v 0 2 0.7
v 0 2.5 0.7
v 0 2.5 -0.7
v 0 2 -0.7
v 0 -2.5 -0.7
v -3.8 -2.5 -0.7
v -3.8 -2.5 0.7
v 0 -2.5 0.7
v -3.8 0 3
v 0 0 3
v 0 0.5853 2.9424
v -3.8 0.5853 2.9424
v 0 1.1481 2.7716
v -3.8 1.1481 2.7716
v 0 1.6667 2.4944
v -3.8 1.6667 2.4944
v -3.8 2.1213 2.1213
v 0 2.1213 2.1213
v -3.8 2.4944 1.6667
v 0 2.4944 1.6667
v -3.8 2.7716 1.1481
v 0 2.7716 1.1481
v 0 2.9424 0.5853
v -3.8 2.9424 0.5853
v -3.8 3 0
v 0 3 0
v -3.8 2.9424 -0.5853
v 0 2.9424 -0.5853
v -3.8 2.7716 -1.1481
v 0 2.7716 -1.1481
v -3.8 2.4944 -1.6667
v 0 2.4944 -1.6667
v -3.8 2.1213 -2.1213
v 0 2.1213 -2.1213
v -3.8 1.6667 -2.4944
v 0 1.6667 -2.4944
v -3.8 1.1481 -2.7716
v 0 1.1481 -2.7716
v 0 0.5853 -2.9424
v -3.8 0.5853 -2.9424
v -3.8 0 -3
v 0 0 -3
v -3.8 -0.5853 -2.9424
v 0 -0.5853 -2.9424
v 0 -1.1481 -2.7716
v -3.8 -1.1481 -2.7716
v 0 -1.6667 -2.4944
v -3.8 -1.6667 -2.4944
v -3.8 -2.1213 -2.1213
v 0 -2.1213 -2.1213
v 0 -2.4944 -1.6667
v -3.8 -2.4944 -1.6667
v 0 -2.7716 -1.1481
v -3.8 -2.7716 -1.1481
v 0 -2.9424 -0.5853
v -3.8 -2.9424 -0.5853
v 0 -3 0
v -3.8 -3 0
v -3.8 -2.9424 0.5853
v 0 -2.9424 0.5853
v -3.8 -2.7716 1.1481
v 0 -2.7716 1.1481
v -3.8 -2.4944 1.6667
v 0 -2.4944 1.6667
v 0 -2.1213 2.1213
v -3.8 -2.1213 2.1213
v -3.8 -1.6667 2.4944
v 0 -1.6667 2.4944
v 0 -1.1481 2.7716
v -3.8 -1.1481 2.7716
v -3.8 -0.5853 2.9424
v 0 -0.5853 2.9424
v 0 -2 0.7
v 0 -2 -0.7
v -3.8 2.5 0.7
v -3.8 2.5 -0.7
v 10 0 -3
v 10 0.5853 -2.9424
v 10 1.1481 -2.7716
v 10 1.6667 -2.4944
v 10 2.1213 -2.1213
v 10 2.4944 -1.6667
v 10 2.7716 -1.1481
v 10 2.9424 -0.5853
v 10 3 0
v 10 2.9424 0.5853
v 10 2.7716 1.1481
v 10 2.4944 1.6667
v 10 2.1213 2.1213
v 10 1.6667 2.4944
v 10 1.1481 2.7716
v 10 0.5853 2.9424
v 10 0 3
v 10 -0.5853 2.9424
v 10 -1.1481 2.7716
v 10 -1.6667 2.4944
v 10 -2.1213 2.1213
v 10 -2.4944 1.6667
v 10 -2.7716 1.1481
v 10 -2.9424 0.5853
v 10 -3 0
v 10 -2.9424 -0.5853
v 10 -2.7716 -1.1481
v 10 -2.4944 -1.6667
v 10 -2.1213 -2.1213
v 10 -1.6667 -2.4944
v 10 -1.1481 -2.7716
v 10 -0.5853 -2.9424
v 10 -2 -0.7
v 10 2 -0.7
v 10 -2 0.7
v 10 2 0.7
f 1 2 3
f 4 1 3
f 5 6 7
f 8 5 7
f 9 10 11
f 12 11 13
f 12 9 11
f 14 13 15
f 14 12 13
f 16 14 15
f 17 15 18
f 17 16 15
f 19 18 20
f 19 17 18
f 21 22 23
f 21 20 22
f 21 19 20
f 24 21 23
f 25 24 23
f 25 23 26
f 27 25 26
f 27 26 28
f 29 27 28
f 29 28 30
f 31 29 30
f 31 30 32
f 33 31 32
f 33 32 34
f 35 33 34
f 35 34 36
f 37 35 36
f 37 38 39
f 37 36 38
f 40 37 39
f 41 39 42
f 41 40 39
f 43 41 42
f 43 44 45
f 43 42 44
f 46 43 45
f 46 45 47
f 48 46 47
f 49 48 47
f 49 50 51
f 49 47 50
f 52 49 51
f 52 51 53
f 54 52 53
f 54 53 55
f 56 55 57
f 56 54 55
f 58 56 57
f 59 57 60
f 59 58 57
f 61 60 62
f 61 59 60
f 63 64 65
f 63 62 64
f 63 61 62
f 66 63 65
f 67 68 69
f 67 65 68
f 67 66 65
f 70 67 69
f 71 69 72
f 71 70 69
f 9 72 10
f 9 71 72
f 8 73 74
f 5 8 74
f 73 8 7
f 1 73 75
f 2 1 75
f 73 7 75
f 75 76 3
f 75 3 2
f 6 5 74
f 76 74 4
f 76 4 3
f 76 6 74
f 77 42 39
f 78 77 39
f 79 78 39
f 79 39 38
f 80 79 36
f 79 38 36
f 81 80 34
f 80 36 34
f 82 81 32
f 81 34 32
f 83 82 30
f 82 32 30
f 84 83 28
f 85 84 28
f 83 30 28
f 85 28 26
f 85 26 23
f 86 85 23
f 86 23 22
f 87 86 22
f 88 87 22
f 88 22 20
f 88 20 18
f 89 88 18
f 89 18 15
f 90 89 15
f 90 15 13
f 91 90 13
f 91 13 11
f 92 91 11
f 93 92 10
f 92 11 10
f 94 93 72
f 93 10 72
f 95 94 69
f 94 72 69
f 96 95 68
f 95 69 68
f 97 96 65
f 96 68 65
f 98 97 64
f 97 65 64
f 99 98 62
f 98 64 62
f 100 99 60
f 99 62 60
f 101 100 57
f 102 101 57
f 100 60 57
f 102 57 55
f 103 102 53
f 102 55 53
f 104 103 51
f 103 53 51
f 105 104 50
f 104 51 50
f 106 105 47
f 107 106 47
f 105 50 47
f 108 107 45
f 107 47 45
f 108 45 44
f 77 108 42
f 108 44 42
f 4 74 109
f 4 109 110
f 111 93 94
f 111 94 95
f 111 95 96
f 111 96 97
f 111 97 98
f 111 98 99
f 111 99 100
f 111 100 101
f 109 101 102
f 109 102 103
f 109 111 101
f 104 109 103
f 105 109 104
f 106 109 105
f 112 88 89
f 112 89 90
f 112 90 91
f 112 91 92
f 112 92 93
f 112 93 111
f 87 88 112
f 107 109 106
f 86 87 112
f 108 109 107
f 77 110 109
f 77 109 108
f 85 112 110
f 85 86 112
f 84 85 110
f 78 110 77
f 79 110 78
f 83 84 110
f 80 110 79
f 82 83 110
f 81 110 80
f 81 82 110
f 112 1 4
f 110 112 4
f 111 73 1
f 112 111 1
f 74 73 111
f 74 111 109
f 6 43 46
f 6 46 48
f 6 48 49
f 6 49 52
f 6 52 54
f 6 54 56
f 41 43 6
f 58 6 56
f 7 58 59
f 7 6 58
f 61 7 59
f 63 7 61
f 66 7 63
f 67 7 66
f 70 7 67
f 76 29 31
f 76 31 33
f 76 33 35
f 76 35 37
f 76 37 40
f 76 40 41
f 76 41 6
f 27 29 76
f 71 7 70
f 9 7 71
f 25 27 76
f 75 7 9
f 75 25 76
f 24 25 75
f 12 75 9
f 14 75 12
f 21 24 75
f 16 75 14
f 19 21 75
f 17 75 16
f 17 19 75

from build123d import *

# Parameters (mm, degrees)
SKETCH1_R           = 3
SKETCH1_W           = 1.4
SKETCH1_H           = 4
BOSS_EXTRUDE1_DEPTH = 10
BOSS_EXTRUDE2_START = 3.8
SKETCH2_R           = 3
SKETCH2_W           = 1.4
SKETCH2_H           = 5
BOSS_EXTRUDE2_DEPTH = 3.8


with BuildPart() as part:
    # Sketch1 → Boss-Extrude1 (new body)
    with BuildSketch(Plane(origin=(0, 0, 0), x_dir=(0, 0, -1), z_dir=(1, 0, 0))):
        Circle(SKETCH1_R)
        Rectangle(SKETCH1_W, SKETCH1_H, mode=Mode.SUBTRACT)
    extrude(amount=BOSS_EXTRUDE1_DEPTH)

    # Sketch2 → Boss-Extrude2 (add)
    with BuildSketch(Plane.ZY.offset(BOSS_EXTRUDE2_START)):
        Circle(SKETCH2_R)
        Rectangle(SKETCH2_W, SKETCH2_H, mode=Mode.SUBTRACT)
    extrude(amount=-BOSS_EXTRUDE2_DEPTH)


solid = part.part
